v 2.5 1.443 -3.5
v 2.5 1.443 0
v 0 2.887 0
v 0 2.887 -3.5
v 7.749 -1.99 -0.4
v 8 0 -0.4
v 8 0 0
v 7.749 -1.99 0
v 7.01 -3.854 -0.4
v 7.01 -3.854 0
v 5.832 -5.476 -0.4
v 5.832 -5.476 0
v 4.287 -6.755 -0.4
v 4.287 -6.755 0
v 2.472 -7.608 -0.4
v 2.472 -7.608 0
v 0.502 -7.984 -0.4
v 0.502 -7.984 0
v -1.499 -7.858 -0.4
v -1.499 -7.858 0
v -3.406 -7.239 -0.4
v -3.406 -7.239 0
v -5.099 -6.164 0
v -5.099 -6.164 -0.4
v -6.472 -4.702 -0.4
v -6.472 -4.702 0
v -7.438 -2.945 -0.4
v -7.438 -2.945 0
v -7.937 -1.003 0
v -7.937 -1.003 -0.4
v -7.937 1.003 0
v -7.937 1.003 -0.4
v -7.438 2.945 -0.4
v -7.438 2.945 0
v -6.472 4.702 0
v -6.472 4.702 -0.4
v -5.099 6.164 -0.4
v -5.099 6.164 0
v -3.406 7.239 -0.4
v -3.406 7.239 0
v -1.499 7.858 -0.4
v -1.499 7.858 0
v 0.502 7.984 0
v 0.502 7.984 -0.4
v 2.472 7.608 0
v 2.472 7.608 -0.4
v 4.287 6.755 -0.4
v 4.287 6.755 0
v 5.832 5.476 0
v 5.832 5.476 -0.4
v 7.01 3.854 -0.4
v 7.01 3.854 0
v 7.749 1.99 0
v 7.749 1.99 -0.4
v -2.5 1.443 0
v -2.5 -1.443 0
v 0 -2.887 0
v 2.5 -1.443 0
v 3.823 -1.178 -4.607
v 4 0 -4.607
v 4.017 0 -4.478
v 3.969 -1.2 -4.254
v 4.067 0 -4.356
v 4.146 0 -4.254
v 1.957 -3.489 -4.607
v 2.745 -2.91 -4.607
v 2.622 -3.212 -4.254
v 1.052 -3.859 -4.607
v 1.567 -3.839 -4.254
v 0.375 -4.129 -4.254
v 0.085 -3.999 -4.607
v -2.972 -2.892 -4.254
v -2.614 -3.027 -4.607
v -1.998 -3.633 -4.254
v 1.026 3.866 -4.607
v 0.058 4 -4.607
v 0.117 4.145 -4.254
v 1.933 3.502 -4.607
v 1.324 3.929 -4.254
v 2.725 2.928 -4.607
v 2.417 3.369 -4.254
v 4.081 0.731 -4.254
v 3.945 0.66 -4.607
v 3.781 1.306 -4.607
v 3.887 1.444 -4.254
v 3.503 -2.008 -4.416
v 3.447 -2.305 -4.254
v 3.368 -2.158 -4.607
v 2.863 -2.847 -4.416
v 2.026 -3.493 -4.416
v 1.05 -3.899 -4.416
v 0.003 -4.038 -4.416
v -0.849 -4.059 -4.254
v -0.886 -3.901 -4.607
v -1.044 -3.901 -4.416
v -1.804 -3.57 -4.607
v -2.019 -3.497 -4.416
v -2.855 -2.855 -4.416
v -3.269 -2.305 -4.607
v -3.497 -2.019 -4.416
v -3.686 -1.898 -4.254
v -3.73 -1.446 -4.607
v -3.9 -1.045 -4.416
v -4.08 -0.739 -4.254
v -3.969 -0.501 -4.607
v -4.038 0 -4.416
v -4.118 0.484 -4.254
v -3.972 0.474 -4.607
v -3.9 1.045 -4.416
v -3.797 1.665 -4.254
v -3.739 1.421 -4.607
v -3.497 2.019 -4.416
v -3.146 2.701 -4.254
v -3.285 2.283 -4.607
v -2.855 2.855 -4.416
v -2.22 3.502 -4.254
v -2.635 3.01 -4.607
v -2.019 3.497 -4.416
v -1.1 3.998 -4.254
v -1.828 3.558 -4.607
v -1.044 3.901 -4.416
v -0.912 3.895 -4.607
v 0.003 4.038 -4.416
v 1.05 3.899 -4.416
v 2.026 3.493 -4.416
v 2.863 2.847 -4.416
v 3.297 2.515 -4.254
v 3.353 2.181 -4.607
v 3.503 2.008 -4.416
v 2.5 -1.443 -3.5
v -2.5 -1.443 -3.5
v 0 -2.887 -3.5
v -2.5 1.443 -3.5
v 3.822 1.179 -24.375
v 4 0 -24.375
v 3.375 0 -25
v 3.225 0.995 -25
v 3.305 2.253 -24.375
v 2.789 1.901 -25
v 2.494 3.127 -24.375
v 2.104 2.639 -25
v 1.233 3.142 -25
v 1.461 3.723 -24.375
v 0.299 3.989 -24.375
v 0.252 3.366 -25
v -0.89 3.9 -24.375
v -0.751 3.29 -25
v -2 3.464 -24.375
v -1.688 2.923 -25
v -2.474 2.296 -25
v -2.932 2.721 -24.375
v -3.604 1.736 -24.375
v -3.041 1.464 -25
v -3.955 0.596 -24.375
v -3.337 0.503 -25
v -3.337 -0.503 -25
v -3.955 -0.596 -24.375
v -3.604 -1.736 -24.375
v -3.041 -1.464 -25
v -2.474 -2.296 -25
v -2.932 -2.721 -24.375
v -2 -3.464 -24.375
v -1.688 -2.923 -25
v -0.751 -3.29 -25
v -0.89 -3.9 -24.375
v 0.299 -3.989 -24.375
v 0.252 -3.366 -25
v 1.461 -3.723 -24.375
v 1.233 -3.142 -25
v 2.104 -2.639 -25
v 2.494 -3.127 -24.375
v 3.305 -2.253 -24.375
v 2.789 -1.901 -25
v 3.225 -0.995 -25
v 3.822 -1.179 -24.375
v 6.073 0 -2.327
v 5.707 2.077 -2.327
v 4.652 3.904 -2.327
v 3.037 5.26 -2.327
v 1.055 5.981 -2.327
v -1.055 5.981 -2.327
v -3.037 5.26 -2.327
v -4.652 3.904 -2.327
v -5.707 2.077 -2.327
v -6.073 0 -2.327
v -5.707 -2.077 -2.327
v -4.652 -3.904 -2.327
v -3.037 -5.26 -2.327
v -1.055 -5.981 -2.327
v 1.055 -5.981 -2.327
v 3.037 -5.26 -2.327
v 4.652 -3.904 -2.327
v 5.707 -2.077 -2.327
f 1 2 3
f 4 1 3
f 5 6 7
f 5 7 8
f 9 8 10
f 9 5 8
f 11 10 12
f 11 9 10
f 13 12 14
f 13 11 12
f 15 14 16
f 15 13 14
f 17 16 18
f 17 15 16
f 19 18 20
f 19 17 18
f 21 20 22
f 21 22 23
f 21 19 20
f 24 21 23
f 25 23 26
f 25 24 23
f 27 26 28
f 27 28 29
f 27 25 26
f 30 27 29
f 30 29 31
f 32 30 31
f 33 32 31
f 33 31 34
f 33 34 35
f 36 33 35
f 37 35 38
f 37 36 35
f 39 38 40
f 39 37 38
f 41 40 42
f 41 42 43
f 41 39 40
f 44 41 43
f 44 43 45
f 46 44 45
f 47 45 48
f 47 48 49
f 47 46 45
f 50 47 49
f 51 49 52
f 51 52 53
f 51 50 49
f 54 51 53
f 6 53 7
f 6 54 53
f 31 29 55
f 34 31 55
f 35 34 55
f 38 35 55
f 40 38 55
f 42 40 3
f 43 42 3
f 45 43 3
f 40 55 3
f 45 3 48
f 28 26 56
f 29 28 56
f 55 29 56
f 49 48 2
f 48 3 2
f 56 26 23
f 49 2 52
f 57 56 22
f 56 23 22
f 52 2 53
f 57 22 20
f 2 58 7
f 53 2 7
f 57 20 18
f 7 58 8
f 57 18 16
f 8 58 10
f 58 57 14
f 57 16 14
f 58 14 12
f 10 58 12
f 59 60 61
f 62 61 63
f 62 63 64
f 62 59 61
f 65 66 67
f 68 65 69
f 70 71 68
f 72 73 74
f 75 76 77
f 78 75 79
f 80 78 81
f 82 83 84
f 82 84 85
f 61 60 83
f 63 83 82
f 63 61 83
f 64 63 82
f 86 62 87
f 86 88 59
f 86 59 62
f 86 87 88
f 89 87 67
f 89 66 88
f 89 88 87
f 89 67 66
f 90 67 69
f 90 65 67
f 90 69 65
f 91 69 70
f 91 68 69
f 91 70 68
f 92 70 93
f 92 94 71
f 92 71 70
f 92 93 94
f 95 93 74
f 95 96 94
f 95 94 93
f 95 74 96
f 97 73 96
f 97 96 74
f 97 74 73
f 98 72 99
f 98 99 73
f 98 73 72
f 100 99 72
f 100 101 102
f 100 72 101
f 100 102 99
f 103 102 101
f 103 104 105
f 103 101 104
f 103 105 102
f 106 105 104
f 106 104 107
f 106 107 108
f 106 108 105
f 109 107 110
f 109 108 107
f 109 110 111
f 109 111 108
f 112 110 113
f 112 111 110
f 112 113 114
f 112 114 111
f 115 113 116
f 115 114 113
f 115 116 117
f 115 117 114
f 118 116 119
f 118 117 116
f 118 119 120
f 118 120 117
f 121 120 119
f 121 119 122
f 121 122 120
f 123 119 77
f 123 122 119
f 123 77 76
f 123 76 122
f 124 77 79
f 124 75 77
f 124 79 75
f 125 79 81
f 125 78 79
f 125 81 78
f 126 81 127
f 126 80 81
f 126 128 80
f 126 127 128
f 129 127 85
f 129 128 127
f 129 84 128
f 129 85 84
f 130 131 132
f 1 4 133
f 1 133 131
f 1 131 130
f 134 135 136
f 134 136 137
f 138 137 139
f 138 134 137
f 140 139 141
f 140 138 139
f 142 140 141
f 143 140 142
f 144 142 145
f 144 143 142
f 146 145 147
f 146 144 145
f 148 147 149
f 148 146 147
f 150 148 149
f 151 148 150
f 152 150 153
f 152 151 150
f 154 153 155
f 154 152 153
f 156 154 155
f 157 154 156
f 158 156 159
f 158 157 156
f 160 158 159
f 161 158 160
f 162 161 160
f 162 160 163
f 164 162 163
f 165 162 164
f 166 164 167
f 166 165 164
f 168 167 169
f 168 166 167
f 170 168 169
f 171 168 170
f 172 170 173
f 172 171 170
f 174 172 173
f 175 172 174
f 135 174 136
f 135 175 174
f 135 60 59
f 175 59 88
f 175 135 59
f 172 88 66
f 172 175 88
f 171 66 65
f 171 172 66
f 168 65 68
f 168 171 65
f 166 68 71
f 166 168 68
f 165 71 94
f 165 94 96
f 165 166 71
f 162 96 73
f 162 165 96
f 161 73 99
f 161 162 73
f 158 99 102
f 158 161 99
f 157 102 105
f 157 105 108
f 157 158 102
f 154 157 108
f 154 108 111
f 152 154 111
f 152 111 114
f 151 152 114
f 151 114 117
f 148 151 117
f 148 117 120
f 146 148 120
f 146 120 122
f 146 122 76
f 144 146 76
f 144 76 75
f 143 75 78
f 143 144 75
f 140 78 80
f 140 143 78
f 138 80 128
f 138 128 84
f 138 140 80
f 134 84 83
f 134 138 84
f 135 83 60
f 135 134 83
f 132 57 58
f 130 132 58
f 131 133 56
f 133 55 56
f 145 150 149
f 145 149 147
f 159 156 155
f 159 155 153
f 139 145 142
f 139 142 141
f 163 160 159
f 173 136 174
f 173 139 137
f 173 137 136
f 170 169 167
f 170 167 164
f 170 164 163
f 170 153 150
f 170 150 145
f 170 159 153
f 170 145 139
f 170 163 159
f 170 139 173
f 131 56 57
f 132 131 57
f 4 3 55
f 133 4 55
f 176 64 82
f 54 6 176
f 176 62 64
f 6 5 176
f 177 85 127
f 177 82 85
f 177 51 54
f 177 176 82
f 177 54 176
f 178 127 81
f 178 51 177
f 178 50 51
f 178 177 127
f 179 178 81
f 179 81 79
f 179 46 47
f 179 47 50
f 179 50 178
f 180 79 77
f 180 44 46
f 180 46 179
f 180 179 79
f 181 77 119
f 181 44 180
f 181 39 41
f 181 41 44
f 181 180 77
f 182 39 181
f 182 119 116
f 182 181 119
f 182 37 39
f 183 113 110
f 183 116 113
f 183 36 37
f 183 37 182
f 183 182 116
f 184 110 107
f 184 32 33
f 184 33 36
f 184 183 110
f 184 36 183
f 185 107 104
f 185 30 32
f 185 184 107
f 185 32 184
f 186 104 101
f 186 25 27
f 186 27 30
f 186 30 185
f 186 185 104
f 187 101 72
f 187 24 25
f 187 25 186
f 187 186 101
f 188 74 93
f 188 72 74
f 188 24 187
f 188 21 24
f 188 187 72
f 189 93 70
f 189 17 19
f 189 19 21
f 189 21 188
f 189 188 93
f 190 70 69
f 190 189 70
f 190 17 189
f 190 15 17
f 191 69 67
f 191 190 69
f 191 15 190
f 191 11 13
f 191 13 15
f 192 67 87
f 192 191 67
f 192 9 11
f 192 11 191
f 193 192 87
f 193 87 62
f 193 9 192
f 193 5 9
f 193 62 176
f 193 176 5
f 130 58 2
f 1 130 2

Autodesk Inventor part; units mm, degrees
ref_plane "YZ Plane" through (0, 0, 0) normal (1, 0, 0) x (0, 1, 0)
sketch "Sketch1" plane through (0, 0, 0) normal (0, 1, 0) x (-1, 0, 0)
  point P0 (0, 0)
sketch "Sketch2" plane through (0, 0, 0) normal (0, 1, 0) x (-1, 0, 0)
  line L0 (-4, -25) -> (0, -25)
  line L1 (-4, -4.4) -> (-4, -25)
  line L2 (-8, -0.4) -> (-4, -4.4)
  line L3 (-8, 0) -> (-8, -0.4)
  line L4 (0, 0) -> (-8, 0)
  line L5 (0, -25) -> (0, 0)
  line L6 (0, -25) -> (0, 0)
  line L7 (0, -30) -> (0, 5) projected
  line L8 (1.6, 0) -> (-9.6, 0) projected
  dimension "d3" = 8
  dimension "d5" = 4
  dimension "d7" = 25
  dimension "ParC" = 0.4
  dimension "d22" = 0
  dimension "d23" = 0
  dimension "d43" = 45
revolve "Revolution1" add sketch "Sketch2" angle 360 about axis through (0, 0, -25) along (0, 0, -1)
sketch "Sketch3" plane through (0, 0, 0) normal (0, 0, 1) x (1, 0, 0)
  line L0 (-2.5, 1.4434) -> (-2.5, -1.4434)
  line L1 (0, 2.8868) -> (-2.5, 1.4434)
  line L2 (2.5, 1.4434) -> (0, 2.8868)
  line L3 (2.5, -1.4434) -> (2.5, 1.4434)
  line L4 (0, -2.8868) -> (2.5, -1.4434)
  line L5 (-2.5, -1.4434) -> (0, -2.8868)
  circle A0 centre (0, 0) radius 2.5 construction
  circle A1 centre (0, 0) radius 4 construction
  dimension "d11" = 5
  dimension "d13" = 120
  dimension "d15" = 120
extrude "Extrusion1" cut sketch "Sketch3" against normal blind 3.5
fillet "Fillet1" radius 0.5 1 edges at (-4, 0, -4.4)
chamfer "Chamfer1" distance 0.625 angle 45 1 edges at (-4, 0, -25) measured on face at (-0.9596, 3.8832, -18.2024)
thread "Thread1" size "M8x1.25" class "6g" standard "ISO Metric profile" length 18.1
ref_plane "MSC_PF1" through (0, 0, 0) normal (1, 0, 0) x (0, 1, 0)
ref_plane "MSC_PT1" through (0, 0, 0) normal (0, 0, -1) x (-1, 0, 0)
equation "\"d3\" = 0.5 * dk"
equation "\"d5\" = 0.5 * NND"
equation "\"d7\" = NLG"
equation "\"d43\" = 0.5 * ang"
equation "\"d18\" = r"
equation "\"d19\" = 0.5 * PTC"
equation "\"d39\" = 0.5 * PTC"
equation "\"d11\" = ParS"
equation "\"d16\" = ParT"
equation "\"NND\" = 8"
equation "\"PTC\" = 1.25"
equation "\"dk\" = 16"
equation "\"ParK\" = 4.4"
equation "\"ParS\" = 5"
equation "\"ParT\" = 3.5"
equation "\"r\" = 0.5"
equation "\"NLG\" = 25"
equation "\"ang\" = 90deg"
equation "\"THREADDIA\" = NND"
properties part number "ISO 10642 - M8x25" material "Steel, Mild"
